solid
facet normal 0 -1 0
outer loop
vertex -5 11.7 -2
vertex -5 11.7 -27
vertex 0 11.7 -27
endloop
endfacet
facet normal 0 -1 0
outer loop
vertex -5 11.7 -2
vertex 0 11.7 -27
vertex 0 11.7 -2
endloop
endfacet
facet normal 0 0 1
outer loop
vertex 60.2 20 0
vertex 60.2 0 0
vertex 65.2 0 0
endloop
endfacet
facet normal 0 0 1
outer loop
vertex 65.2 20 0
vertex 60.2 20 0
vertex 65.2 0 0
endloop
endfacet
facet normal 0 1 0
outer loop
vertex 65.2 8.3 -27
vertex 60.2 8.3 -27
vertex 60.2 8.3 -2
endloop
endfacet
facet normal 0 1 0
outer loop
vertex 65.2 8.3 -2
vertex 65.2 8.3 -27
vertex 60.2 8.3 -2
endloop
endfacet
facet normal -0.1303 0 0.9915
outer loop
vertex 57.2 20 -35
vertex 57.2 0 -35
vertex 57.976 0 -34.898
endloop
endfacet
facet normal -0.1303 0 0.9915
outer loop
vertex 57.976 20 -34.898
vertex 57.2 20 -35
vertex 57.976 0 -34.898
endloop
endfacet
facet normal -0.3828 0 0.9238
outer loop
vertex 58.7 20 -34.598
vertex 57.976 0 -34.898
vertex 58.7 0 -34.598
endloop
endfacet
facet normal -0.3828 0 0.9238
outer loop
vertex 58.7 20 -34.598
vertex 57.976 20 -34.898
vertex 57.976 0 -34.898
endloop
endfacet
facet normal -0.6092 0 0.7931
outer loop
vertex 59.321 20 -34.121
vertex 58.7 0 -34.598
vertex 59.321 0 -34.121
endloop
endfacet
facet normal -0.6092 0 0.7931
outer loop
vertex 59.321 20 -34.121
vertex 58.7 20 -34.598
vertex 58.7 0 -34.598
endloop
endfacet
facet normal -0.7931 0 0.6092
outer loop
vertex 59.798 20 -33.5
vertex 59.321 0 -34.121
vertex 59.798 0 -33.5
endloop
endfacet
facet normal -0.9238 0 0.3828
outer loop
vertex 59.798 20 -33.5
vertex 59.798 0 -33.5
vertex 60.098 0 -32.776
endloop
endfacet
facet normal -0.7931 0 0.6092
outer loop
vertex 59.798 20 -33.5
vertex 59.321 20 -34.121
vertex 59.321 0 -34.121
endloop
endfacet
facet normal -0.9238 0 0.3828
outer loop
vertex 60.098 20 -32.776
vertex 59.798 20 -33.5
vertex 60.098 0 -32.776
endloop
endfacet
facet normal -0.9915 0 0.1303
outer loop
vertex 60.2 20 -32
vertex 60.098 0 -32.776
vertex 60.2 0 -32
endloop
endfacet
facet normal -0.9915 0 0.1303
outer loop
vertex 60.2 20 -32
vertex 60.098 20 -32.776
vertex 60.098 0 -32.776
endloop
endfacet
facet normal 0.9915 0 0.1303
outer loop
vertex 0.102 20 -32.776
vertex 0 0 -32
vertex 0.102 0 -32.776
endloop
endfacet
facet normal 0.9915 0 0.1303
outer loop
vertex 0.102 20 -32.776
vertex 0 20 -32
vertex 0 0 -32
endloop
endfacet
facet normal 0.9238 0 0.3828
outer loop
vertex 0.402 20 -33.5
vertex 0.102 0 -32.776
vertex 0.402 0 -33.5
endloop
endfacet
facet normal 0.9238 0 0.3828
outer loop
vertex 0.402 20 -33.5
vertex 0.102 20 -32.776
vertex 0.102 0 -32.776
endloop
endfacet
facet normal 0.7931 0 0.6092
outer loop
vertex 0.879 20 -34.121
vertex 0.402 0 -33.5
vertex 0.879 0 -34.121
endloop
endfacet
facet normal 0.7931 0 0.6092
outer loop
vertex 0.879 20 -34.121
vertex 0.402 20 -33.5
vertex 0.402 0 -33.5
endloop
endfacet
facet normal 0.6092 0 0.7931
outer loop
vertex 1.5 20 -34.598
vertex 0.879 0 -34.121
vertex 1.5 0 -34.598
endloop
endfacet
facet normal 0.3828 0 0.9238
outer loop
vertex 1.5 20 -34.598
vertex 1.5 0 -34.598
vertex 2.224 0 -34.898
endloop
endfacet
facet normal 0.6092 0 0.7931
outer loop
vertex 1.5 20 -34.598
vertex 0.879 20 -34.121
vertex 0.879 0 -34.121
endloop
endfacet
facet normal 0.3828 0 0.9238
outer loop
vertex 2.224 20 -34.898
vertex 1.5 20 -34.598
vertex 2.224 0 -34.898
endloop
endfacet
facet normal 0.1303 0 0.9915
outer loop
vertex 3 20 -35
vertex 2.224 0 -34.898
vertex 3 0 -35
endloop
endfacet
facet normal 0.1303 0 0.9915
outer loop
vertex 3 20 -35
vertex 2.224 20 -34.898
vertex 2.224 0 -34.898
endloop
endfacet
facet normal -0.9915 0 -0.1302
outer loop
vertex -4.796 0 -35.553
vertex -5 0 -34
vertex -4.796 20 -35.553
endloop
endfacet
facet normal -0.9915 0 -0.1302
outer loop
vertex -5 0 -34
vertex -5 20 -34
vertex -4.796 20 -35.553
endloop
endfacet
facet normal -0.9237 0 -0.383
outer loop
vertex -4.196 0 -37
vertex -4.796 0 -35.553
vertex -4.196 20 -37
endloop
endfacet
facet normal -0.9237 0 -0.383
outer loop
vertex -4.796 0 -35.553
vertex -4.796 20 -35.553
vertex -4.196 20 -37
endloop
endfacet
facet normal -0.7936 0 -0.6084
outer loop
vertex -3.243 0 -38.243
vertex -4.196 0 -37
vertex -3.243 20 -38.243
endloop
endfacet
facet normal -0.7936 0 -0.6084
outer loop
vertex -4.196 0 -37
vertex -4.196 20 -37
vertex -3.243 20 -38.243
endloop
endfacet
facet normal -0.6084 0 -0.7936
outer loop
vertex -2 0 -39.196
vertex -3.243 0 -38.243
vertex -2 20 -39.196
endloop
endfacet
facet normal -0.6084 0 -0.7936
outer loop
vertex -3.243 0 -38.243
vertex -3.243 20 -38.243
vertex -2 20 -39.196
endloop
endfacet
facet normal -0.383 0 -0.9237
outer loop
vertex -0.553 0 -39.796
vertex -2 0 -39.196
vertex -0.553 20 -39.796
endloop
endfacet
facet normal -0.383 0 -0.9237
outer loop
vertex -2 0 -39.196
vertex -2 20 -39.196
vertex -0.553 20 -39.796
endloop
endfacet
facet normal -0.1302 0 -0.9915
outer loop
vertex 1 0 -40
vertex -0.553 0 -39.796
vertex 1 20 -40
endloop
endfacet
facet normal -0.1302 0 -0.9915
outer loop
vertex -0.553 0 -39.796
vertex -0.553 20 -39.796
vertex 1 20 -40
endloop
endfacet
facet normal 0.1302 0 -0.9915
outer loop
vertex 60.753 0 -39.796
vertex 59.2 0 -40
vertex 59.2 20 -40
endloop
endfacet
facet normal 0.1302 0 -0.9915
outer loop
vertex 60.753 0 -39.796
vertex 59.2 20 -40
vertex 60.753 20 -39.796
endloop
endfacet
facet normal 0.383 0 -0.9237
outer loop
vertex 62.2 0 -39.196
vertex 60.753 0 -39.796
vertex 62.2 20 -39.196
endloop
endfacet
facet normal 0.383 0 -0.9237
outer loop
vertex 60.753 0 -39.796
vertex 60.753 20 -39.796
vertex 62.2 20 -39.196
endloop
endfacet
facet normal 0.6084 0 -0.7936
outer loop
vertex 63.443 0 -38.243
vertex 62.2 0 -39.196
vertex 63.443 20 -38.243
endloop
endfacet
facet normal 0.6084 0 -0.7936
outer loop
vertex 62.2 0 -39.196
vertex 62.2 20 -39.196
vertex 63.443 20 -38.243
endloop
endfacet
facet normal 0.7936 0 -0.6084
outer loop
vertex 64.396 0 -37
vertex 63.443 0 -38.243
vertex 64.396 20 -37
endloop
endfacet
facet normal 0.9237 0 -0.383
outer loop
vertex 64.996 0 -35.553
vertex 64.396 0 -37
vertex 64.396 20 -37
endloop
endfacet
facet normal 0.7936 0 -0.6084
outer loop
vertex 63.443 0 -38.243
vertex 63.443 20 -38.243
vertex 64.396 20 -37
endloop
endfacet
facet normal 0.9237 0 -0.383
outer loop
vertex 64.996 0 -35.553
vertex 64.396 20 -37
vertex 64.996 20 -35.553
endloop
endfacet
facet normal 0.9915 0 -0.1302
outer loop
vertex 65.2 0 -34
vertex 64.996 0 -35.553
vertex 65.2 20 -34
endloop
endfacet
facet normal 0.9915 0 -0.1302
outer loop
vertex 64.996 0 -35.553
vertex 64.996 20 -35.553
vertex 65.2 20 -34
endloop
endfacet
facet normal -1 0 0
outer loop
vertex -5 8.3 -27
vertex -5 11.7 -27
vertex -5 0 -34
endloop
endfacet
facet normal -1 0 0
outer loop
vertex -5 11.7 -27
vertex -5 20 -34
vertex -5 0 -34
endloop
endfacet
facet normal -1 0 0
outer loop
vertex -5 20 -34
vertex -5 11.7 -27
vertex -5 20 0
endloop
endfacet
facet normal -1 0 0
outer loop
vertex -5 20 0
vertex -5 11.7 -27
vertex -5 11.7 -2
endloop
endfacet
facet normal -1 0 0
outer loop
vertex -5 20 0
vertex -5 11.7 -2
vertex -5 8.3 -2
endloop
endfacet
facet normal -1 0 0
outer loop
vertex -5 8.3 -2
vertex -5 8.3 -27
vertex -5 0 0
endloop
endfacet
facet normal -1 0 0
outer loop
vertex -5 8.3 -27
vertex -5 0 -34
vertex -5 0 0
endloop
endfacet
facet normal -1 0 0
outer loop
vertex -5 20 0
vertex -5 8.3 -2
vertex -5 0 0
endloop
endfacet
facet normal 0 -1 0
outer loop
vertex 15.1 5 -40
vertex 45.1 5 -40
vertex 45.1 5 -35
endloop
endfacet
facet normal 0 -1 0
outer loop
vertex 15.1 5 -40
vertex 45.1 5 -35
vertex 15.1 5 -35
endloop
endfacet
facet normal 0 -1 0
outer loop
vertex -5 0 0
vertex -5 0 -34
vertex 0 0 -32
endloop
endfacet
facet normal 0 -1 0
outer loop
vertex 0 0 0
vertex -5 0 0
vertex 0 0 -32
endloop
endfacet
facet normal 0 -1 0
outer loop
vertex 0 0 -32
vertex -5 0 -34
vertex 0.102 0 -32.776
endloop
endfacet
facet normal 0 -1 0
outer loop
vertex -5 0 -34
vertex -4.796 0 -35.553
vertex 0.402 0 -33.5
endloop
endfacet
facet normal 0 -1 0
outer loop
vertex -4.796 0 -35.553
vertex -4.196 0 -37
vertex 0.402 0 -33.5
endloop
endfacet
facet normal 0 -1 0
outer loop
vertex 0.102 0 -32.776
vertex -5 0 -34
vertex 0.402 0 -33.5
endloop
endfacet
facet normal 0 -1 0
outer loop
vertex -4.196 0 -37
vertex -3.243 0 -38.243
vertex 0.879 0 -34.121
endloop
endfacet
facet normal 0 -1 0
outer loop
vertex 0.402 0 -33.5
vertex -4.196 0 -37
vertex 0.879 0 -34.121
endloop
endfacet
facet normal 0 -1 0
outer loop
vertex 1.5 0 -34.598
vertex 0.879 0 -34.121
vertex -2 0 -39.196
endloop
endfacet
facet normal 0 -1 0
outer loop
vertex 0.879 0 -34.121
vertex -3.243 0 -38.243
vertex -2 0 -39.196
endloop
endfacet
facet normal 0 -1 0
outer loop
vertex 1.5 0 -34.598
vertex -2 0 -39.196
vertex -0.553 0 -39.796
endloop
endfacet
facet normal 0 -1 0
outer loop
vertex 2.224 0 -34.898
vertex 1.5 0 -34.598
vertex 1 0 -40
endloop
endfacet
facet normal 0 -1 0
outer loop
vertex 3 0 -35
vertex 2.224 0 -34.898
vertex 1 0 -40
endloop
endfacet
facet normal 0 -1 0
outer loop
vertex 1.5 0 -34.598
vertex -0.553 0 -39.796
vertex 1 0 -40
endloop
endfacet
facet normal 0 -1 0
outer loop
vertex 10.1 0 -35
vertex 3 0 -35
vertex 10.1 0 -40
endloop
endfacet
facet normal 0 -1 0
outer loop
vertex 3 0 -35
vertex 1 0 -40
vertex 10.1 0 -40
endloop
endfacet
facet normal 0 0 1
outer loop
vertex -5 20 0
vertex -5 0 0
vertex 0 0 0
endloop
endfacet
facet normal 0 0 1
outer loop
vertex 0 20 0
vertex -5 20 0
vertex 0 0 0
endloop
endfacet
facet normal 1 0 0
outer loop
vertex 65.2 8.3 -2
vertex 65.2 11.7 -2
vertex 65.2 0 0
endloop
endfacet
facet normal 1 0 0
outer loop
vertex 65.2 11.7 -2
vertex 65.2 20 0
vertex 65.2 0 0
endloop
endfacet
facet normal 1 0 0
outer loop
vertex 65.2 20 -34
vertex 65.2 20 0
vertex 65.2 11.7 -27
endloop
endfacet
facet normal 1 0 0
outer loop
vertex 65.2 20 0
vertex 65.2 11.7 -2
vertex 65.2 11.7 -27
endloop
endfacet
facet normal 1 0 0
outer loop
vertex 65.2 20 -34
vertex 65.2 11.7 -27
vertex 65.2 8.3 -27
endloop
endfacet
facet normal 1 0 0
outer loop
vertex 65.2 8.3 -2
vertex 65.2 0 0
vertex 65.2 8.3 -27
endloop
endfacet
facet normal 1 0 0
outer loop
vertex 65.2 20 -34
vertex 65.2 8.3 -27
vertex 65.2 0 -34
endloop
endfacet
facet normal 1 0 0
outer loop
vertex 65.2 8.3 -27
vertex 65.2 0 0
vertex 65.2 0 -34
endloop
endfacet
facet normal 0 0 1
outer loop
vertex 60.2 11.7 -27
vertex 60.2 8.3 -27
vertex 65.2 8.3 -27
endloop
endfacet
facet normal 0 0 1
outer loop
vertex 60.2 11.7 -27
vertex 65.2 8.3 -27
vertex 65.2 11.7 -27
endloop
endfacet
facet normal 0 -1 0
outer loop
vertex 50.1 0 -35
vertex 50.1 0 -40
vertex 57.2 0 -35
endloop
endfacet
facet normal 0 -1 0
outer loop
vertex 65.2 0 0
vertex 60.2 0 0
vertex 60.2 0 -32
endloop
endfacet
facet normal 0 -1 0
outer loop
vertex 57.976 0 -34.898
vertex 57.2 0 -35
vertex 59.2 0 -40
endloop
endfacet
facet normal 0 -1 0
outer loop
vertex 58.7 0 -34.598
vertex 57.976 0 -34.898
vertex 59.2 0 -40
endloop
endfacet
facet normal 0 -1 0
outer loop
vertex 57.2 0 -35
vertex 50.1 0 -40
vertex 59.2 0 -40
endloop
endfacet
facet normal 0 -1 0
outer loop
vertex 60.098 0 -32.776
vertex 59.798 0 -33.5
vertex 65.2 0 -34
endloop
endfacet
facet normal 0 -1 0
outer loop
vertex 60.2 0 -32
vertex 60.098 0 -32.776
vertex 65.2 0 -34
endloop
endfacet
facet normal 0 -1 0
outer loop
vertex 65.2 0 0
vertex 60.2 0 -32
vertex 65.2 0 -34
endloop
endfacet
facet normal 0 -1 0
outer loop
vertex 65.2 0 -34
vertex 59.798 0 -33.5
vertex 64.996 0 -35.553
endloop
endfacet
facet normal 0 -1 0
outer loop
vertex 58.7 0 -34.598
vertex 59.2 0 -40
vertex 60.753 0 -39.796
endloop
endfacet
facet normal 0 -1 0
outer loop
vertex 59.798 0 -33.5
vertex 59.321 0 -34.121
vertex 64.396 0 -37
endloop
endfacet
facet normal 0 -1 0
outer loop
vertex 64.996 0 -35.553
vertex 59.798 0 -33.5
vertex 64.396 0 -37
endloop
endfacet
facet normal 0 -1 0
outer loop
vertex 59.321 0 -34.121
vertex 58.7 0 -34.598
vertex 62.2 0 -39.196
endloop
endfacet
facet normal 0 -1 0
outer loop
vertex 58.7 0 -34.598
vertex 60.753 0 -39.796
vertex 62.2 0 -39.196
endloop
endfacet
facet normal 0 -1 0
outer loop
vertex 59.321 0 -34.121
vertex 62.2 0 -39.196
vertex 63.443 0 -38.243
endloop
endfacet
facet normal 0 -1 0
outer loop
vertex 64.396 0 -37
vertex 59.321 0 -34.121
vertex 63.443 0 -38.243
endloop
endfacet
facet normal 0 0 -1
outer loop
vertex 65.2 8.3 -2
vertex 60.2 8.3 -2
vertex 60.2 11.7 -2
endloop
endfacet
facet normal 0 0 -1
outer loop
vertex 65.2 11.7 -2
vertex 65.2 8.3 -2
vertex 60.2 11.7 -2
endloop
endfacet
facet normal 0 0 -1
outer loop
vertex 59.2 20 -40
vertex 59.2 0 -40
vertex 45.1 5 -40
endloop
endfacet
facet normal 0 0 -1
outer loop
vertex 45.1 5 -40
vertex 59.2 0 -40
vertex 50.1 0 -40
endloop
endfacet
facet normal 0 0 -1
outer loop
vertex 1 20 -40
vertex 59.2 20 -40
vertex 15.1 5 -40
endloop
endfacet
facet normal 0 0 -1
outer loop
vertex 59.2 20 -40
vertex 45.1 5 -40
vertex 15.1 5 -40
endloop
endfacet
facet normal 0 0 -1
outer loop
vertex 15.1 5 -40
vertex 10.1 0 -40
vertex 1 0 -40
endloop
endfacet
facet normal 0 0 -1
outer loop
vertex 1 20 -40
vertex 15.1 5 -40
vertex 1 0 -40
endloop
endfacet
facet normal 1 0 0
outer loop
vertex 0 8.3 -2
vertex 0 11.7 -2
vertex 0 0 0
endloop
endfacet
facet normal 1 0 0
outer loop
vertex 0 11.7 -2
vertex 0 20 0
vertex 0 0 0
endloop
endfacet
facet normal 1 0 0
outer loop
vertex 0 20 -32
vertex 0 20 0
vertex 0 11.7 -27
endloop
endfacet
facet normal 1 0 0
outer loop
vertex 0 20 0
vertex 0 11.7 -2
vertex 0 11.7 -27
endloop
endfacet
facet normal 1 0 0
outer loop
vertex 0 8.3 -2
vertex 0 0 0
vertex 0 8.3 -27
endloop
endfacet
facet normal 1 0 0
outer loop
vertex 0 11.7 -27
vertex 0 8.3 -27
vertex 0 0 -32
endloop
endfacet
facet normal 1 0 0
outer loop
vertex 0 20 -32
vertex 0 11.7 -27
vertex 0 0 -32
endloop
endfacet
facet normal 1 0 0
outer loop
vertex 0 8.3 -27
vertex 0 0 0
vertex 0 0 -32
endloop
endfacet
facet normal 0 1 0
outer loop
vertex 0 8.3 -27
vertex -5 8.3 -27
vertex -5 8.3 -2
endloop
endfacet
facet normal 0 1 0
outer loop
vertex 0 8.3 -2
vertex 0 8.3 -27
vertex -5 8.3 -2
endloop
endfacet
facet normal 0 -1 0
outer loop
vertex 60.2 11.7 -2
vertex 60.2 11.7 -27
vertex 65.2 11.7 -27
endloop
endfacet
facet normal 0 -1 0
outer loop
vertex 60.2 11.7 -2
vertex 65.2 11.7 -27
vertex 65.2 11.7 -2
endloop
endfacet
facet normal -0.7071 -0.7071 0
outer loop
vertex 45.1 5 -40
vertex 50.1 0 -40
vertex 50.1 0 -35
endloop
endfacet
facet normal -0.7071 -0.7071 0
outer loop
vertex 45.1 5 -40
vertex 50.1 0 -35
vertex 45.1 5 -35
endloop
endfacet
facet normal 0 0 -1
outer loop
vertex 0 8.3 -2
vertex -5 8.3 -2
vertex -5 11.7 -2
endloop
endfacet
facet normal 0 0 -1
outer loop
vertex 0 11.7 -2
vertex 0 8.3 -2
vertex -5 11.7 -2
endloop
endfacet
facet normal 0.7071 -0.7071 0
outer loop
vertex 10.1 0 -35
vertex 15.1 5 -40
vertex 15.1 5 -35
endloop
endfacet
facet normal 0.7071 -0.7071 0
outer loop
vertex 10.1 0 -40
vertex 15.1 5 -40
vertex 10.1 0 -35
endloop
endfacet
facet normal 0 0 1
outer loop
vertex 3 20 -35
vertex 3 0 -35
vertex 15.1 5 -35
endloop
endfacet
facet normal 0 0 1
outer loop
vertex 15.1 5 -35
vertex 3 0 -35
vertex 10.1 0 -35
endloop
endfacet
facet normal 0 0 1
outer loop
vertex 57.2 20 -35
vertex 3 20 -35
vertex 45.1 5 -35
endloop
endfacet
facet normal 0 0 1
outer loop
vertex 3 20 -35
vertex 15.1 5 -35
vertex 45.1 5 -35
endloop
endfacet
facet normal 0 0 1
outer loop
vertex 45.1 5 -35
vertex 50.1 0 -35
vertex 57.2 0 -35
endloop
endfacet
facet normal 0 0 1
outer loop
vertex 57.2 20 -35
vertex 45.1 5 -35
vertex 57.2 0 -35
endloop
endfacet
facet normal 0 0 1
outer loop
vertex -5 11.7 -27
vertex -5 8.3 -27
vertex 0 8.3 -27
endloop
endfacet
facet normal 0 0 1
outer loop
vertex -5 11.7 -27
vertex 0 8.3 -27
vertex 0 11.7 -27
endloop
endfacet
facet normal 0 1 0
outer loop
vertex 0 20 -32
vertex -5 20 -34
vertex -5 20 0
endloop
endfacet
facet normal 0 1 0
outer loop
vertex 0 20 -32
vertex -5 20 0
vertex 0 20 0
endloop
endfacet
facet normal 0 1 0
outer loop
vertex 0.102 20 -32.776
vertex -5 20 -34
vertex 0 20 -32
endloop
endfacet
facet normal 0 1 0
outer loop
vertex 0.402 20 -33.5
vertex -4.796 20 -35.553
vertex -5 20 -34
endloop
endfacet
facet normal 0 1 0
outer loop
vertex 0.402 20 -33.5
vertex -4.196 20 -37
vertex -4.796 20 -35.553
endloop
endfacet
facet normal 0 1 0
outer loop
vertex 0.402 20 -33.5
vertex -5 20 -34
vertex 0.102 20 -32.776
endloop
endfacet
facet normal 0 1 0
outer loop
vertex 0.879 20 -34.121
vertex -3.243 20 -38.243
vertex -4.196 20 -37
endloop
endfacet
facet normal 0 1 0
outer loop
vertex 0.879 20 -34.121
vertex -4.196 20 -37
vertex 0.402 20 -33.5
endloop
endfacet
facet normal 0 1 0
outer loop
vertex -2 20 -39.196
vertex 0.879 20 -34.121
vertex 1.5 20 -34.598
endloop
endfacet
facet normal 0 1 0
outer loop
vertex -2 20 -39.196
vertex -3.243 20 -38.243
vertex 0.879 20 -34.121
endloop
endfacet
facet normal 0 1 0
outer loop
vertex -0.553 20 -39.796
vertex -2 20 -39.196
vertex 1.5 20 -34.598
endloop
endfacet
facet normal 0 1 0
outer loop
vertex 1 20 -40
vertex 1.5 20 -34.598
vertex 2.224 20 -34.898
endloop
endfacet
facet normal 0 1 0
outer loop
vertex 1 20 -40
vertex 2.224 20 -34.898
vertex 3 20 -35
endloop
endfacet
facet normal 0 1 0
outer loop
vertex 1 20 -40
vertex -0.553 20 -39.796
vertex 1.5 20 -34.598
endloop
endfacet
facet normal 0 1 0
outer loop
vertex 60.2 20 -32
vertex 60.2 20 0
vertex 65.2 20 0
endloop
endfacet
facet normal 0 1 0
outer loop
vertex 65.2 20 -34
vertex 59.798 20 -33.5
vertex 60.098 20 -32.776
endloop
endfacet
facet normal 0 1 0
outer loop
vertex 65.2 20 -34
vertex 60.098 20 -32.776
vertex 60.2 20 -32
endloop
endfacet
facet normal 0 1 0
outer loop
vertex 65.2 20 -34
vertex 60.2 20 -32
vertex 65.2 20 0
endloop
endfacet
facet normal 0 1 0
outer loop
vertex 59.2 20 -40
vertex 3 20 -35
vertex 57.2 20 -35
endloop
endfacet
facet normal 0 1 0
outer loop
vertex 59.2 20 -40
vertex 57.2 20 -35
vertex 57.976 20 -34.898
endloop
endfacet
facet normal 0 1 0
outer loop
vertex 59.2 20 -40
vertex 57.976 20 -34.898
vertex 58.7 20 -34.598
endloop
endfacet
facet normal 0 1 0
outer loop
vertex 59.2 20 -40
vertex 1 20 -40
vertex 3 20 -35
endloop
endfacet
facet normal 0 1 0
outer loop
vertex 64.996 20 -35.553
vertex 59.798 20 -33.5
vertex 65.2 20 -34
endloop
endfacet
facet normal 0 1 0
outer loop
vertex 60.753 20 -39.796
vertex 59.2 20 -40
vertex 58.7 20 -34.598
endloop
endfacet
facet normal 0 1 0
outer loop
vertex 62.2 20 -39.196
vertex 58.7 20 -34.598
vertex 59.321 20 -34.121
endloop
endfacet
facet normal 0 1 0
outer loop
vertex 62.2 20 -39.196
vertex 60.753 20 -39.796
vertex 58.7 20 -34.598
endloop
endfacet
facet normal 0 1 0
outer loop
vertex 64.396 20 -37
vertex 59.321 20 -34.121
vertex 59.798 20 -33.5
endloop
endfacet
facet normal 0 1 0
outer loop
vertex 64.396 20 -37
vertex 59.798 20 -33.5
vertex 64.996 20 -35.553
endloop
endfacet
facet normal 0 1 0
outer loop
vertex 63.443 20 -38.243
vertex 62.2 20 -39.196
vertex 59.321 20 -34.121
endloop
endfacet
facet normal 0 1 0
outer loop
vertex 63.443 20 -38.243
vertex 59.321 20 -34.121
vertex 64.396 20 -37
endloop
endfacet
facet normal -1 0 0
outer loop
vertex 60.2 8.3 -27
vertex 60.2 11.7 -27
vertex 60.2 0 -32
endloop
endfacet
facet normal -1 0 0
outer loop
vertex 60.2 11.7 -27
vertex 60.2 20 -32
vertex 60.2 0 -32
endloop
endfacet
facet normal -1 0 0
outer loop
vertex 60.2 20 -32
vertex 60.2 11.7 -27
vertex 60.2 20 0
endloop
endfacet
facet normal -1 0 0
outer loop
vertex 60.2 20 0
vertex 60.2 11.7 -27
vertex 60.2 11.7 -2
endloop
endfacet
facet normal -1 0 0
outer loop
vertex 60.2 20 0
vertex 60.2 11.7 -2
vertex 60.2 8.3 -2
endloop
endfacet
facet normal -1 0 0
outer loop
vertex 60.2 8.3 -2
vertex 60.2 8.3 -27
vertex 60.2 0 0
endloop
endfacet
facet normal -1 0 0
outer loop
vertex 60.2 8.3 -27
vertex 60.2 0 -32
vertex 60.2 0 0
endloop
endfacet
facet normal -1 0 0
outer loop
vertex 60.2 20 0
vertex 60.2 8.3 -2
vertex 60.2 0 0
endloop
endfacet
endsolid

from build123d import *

# Parameters (mm, degrees)
AUFSATZ_LINEAR_AUSTRAGEN1_DEPTH = 20
SKIZZE2_W                       = 25
SKIZZE2_H                       = 3.4
SCHNITT_LINEAR_AUSTRAGEN1_DEPTH = 84.234848471
VERRUNDUNG1_R                   = 3
VERRUNDUNG2_R                   = 6
SCHNITT_LINEAR_AUSTRAGEN2_DEPTH = 80.063518768


with BuildPart() as part:
    # Skizze1 → Aufsatz-Linear austragen1 (new body)
    with BuildSketch(Plane(origin=(0, 0, 0), x_dir=(1, 0, 0), z_dir=(0, 1, 0))):
        Polygon((0, 0), (0, 35), (60.2, 35), (60.2, 0), (65.2, 0), (65.2, 40), (-5, 40), (-5, 0), align=None)
    extrude(amount=AUFSATZ_LINEAR_AUSTRAGEN1_DEPTH)

    # Skizze2 → Schnitt-Linear austragen1 (cut, through all)
    with BuildSketch(Plane.ZY.offset(5)):
        with Locations((-14.5, 10)):
            Rectangle(SKIZZE2_W, SKIZZE2_H)
    extrude(amount=-SCHNITT_LINEAR_AUSTRAGEN1_DEPTH, mode=Mode.SUBTRACT)

    # Verrundung1
    verrundung1_edges = [part.edges().sort_by_distance(p)[0] for p in [
        (60.2, 10, -35),
        (0, 10, -35),
    ]]
    fillet(verrundung1_edges, radius=VERRUNDUNG1_R)

    # Verrundung2
    verrundung2_edges = [part.edges().sort_by_distance(p)[0] for p in [
        (-5, 10, -40),
        (65.2, 10, -40),
    ]]
    fillet(verrundung2_edges, radius=VERRUNDUNG2_R)

    # Skizze3 → Schnitt-Linear austragen2 (cut, through all)
    with BuildSketch(Plane(origin=(0, 0, -40), x_dir=(-1, 0, 0), z_dir=(0, 0, -1))):
        Polygon((-45.1, 5), (-15.1, 5), (-10.1, 0), (-50.1, 0), align=None)
    extrude(amount=-SCHNITT_LINEAR_AUSTRAGEN2_DEPTH, mode=Mode.SUBTRACT)


solid = part.part
